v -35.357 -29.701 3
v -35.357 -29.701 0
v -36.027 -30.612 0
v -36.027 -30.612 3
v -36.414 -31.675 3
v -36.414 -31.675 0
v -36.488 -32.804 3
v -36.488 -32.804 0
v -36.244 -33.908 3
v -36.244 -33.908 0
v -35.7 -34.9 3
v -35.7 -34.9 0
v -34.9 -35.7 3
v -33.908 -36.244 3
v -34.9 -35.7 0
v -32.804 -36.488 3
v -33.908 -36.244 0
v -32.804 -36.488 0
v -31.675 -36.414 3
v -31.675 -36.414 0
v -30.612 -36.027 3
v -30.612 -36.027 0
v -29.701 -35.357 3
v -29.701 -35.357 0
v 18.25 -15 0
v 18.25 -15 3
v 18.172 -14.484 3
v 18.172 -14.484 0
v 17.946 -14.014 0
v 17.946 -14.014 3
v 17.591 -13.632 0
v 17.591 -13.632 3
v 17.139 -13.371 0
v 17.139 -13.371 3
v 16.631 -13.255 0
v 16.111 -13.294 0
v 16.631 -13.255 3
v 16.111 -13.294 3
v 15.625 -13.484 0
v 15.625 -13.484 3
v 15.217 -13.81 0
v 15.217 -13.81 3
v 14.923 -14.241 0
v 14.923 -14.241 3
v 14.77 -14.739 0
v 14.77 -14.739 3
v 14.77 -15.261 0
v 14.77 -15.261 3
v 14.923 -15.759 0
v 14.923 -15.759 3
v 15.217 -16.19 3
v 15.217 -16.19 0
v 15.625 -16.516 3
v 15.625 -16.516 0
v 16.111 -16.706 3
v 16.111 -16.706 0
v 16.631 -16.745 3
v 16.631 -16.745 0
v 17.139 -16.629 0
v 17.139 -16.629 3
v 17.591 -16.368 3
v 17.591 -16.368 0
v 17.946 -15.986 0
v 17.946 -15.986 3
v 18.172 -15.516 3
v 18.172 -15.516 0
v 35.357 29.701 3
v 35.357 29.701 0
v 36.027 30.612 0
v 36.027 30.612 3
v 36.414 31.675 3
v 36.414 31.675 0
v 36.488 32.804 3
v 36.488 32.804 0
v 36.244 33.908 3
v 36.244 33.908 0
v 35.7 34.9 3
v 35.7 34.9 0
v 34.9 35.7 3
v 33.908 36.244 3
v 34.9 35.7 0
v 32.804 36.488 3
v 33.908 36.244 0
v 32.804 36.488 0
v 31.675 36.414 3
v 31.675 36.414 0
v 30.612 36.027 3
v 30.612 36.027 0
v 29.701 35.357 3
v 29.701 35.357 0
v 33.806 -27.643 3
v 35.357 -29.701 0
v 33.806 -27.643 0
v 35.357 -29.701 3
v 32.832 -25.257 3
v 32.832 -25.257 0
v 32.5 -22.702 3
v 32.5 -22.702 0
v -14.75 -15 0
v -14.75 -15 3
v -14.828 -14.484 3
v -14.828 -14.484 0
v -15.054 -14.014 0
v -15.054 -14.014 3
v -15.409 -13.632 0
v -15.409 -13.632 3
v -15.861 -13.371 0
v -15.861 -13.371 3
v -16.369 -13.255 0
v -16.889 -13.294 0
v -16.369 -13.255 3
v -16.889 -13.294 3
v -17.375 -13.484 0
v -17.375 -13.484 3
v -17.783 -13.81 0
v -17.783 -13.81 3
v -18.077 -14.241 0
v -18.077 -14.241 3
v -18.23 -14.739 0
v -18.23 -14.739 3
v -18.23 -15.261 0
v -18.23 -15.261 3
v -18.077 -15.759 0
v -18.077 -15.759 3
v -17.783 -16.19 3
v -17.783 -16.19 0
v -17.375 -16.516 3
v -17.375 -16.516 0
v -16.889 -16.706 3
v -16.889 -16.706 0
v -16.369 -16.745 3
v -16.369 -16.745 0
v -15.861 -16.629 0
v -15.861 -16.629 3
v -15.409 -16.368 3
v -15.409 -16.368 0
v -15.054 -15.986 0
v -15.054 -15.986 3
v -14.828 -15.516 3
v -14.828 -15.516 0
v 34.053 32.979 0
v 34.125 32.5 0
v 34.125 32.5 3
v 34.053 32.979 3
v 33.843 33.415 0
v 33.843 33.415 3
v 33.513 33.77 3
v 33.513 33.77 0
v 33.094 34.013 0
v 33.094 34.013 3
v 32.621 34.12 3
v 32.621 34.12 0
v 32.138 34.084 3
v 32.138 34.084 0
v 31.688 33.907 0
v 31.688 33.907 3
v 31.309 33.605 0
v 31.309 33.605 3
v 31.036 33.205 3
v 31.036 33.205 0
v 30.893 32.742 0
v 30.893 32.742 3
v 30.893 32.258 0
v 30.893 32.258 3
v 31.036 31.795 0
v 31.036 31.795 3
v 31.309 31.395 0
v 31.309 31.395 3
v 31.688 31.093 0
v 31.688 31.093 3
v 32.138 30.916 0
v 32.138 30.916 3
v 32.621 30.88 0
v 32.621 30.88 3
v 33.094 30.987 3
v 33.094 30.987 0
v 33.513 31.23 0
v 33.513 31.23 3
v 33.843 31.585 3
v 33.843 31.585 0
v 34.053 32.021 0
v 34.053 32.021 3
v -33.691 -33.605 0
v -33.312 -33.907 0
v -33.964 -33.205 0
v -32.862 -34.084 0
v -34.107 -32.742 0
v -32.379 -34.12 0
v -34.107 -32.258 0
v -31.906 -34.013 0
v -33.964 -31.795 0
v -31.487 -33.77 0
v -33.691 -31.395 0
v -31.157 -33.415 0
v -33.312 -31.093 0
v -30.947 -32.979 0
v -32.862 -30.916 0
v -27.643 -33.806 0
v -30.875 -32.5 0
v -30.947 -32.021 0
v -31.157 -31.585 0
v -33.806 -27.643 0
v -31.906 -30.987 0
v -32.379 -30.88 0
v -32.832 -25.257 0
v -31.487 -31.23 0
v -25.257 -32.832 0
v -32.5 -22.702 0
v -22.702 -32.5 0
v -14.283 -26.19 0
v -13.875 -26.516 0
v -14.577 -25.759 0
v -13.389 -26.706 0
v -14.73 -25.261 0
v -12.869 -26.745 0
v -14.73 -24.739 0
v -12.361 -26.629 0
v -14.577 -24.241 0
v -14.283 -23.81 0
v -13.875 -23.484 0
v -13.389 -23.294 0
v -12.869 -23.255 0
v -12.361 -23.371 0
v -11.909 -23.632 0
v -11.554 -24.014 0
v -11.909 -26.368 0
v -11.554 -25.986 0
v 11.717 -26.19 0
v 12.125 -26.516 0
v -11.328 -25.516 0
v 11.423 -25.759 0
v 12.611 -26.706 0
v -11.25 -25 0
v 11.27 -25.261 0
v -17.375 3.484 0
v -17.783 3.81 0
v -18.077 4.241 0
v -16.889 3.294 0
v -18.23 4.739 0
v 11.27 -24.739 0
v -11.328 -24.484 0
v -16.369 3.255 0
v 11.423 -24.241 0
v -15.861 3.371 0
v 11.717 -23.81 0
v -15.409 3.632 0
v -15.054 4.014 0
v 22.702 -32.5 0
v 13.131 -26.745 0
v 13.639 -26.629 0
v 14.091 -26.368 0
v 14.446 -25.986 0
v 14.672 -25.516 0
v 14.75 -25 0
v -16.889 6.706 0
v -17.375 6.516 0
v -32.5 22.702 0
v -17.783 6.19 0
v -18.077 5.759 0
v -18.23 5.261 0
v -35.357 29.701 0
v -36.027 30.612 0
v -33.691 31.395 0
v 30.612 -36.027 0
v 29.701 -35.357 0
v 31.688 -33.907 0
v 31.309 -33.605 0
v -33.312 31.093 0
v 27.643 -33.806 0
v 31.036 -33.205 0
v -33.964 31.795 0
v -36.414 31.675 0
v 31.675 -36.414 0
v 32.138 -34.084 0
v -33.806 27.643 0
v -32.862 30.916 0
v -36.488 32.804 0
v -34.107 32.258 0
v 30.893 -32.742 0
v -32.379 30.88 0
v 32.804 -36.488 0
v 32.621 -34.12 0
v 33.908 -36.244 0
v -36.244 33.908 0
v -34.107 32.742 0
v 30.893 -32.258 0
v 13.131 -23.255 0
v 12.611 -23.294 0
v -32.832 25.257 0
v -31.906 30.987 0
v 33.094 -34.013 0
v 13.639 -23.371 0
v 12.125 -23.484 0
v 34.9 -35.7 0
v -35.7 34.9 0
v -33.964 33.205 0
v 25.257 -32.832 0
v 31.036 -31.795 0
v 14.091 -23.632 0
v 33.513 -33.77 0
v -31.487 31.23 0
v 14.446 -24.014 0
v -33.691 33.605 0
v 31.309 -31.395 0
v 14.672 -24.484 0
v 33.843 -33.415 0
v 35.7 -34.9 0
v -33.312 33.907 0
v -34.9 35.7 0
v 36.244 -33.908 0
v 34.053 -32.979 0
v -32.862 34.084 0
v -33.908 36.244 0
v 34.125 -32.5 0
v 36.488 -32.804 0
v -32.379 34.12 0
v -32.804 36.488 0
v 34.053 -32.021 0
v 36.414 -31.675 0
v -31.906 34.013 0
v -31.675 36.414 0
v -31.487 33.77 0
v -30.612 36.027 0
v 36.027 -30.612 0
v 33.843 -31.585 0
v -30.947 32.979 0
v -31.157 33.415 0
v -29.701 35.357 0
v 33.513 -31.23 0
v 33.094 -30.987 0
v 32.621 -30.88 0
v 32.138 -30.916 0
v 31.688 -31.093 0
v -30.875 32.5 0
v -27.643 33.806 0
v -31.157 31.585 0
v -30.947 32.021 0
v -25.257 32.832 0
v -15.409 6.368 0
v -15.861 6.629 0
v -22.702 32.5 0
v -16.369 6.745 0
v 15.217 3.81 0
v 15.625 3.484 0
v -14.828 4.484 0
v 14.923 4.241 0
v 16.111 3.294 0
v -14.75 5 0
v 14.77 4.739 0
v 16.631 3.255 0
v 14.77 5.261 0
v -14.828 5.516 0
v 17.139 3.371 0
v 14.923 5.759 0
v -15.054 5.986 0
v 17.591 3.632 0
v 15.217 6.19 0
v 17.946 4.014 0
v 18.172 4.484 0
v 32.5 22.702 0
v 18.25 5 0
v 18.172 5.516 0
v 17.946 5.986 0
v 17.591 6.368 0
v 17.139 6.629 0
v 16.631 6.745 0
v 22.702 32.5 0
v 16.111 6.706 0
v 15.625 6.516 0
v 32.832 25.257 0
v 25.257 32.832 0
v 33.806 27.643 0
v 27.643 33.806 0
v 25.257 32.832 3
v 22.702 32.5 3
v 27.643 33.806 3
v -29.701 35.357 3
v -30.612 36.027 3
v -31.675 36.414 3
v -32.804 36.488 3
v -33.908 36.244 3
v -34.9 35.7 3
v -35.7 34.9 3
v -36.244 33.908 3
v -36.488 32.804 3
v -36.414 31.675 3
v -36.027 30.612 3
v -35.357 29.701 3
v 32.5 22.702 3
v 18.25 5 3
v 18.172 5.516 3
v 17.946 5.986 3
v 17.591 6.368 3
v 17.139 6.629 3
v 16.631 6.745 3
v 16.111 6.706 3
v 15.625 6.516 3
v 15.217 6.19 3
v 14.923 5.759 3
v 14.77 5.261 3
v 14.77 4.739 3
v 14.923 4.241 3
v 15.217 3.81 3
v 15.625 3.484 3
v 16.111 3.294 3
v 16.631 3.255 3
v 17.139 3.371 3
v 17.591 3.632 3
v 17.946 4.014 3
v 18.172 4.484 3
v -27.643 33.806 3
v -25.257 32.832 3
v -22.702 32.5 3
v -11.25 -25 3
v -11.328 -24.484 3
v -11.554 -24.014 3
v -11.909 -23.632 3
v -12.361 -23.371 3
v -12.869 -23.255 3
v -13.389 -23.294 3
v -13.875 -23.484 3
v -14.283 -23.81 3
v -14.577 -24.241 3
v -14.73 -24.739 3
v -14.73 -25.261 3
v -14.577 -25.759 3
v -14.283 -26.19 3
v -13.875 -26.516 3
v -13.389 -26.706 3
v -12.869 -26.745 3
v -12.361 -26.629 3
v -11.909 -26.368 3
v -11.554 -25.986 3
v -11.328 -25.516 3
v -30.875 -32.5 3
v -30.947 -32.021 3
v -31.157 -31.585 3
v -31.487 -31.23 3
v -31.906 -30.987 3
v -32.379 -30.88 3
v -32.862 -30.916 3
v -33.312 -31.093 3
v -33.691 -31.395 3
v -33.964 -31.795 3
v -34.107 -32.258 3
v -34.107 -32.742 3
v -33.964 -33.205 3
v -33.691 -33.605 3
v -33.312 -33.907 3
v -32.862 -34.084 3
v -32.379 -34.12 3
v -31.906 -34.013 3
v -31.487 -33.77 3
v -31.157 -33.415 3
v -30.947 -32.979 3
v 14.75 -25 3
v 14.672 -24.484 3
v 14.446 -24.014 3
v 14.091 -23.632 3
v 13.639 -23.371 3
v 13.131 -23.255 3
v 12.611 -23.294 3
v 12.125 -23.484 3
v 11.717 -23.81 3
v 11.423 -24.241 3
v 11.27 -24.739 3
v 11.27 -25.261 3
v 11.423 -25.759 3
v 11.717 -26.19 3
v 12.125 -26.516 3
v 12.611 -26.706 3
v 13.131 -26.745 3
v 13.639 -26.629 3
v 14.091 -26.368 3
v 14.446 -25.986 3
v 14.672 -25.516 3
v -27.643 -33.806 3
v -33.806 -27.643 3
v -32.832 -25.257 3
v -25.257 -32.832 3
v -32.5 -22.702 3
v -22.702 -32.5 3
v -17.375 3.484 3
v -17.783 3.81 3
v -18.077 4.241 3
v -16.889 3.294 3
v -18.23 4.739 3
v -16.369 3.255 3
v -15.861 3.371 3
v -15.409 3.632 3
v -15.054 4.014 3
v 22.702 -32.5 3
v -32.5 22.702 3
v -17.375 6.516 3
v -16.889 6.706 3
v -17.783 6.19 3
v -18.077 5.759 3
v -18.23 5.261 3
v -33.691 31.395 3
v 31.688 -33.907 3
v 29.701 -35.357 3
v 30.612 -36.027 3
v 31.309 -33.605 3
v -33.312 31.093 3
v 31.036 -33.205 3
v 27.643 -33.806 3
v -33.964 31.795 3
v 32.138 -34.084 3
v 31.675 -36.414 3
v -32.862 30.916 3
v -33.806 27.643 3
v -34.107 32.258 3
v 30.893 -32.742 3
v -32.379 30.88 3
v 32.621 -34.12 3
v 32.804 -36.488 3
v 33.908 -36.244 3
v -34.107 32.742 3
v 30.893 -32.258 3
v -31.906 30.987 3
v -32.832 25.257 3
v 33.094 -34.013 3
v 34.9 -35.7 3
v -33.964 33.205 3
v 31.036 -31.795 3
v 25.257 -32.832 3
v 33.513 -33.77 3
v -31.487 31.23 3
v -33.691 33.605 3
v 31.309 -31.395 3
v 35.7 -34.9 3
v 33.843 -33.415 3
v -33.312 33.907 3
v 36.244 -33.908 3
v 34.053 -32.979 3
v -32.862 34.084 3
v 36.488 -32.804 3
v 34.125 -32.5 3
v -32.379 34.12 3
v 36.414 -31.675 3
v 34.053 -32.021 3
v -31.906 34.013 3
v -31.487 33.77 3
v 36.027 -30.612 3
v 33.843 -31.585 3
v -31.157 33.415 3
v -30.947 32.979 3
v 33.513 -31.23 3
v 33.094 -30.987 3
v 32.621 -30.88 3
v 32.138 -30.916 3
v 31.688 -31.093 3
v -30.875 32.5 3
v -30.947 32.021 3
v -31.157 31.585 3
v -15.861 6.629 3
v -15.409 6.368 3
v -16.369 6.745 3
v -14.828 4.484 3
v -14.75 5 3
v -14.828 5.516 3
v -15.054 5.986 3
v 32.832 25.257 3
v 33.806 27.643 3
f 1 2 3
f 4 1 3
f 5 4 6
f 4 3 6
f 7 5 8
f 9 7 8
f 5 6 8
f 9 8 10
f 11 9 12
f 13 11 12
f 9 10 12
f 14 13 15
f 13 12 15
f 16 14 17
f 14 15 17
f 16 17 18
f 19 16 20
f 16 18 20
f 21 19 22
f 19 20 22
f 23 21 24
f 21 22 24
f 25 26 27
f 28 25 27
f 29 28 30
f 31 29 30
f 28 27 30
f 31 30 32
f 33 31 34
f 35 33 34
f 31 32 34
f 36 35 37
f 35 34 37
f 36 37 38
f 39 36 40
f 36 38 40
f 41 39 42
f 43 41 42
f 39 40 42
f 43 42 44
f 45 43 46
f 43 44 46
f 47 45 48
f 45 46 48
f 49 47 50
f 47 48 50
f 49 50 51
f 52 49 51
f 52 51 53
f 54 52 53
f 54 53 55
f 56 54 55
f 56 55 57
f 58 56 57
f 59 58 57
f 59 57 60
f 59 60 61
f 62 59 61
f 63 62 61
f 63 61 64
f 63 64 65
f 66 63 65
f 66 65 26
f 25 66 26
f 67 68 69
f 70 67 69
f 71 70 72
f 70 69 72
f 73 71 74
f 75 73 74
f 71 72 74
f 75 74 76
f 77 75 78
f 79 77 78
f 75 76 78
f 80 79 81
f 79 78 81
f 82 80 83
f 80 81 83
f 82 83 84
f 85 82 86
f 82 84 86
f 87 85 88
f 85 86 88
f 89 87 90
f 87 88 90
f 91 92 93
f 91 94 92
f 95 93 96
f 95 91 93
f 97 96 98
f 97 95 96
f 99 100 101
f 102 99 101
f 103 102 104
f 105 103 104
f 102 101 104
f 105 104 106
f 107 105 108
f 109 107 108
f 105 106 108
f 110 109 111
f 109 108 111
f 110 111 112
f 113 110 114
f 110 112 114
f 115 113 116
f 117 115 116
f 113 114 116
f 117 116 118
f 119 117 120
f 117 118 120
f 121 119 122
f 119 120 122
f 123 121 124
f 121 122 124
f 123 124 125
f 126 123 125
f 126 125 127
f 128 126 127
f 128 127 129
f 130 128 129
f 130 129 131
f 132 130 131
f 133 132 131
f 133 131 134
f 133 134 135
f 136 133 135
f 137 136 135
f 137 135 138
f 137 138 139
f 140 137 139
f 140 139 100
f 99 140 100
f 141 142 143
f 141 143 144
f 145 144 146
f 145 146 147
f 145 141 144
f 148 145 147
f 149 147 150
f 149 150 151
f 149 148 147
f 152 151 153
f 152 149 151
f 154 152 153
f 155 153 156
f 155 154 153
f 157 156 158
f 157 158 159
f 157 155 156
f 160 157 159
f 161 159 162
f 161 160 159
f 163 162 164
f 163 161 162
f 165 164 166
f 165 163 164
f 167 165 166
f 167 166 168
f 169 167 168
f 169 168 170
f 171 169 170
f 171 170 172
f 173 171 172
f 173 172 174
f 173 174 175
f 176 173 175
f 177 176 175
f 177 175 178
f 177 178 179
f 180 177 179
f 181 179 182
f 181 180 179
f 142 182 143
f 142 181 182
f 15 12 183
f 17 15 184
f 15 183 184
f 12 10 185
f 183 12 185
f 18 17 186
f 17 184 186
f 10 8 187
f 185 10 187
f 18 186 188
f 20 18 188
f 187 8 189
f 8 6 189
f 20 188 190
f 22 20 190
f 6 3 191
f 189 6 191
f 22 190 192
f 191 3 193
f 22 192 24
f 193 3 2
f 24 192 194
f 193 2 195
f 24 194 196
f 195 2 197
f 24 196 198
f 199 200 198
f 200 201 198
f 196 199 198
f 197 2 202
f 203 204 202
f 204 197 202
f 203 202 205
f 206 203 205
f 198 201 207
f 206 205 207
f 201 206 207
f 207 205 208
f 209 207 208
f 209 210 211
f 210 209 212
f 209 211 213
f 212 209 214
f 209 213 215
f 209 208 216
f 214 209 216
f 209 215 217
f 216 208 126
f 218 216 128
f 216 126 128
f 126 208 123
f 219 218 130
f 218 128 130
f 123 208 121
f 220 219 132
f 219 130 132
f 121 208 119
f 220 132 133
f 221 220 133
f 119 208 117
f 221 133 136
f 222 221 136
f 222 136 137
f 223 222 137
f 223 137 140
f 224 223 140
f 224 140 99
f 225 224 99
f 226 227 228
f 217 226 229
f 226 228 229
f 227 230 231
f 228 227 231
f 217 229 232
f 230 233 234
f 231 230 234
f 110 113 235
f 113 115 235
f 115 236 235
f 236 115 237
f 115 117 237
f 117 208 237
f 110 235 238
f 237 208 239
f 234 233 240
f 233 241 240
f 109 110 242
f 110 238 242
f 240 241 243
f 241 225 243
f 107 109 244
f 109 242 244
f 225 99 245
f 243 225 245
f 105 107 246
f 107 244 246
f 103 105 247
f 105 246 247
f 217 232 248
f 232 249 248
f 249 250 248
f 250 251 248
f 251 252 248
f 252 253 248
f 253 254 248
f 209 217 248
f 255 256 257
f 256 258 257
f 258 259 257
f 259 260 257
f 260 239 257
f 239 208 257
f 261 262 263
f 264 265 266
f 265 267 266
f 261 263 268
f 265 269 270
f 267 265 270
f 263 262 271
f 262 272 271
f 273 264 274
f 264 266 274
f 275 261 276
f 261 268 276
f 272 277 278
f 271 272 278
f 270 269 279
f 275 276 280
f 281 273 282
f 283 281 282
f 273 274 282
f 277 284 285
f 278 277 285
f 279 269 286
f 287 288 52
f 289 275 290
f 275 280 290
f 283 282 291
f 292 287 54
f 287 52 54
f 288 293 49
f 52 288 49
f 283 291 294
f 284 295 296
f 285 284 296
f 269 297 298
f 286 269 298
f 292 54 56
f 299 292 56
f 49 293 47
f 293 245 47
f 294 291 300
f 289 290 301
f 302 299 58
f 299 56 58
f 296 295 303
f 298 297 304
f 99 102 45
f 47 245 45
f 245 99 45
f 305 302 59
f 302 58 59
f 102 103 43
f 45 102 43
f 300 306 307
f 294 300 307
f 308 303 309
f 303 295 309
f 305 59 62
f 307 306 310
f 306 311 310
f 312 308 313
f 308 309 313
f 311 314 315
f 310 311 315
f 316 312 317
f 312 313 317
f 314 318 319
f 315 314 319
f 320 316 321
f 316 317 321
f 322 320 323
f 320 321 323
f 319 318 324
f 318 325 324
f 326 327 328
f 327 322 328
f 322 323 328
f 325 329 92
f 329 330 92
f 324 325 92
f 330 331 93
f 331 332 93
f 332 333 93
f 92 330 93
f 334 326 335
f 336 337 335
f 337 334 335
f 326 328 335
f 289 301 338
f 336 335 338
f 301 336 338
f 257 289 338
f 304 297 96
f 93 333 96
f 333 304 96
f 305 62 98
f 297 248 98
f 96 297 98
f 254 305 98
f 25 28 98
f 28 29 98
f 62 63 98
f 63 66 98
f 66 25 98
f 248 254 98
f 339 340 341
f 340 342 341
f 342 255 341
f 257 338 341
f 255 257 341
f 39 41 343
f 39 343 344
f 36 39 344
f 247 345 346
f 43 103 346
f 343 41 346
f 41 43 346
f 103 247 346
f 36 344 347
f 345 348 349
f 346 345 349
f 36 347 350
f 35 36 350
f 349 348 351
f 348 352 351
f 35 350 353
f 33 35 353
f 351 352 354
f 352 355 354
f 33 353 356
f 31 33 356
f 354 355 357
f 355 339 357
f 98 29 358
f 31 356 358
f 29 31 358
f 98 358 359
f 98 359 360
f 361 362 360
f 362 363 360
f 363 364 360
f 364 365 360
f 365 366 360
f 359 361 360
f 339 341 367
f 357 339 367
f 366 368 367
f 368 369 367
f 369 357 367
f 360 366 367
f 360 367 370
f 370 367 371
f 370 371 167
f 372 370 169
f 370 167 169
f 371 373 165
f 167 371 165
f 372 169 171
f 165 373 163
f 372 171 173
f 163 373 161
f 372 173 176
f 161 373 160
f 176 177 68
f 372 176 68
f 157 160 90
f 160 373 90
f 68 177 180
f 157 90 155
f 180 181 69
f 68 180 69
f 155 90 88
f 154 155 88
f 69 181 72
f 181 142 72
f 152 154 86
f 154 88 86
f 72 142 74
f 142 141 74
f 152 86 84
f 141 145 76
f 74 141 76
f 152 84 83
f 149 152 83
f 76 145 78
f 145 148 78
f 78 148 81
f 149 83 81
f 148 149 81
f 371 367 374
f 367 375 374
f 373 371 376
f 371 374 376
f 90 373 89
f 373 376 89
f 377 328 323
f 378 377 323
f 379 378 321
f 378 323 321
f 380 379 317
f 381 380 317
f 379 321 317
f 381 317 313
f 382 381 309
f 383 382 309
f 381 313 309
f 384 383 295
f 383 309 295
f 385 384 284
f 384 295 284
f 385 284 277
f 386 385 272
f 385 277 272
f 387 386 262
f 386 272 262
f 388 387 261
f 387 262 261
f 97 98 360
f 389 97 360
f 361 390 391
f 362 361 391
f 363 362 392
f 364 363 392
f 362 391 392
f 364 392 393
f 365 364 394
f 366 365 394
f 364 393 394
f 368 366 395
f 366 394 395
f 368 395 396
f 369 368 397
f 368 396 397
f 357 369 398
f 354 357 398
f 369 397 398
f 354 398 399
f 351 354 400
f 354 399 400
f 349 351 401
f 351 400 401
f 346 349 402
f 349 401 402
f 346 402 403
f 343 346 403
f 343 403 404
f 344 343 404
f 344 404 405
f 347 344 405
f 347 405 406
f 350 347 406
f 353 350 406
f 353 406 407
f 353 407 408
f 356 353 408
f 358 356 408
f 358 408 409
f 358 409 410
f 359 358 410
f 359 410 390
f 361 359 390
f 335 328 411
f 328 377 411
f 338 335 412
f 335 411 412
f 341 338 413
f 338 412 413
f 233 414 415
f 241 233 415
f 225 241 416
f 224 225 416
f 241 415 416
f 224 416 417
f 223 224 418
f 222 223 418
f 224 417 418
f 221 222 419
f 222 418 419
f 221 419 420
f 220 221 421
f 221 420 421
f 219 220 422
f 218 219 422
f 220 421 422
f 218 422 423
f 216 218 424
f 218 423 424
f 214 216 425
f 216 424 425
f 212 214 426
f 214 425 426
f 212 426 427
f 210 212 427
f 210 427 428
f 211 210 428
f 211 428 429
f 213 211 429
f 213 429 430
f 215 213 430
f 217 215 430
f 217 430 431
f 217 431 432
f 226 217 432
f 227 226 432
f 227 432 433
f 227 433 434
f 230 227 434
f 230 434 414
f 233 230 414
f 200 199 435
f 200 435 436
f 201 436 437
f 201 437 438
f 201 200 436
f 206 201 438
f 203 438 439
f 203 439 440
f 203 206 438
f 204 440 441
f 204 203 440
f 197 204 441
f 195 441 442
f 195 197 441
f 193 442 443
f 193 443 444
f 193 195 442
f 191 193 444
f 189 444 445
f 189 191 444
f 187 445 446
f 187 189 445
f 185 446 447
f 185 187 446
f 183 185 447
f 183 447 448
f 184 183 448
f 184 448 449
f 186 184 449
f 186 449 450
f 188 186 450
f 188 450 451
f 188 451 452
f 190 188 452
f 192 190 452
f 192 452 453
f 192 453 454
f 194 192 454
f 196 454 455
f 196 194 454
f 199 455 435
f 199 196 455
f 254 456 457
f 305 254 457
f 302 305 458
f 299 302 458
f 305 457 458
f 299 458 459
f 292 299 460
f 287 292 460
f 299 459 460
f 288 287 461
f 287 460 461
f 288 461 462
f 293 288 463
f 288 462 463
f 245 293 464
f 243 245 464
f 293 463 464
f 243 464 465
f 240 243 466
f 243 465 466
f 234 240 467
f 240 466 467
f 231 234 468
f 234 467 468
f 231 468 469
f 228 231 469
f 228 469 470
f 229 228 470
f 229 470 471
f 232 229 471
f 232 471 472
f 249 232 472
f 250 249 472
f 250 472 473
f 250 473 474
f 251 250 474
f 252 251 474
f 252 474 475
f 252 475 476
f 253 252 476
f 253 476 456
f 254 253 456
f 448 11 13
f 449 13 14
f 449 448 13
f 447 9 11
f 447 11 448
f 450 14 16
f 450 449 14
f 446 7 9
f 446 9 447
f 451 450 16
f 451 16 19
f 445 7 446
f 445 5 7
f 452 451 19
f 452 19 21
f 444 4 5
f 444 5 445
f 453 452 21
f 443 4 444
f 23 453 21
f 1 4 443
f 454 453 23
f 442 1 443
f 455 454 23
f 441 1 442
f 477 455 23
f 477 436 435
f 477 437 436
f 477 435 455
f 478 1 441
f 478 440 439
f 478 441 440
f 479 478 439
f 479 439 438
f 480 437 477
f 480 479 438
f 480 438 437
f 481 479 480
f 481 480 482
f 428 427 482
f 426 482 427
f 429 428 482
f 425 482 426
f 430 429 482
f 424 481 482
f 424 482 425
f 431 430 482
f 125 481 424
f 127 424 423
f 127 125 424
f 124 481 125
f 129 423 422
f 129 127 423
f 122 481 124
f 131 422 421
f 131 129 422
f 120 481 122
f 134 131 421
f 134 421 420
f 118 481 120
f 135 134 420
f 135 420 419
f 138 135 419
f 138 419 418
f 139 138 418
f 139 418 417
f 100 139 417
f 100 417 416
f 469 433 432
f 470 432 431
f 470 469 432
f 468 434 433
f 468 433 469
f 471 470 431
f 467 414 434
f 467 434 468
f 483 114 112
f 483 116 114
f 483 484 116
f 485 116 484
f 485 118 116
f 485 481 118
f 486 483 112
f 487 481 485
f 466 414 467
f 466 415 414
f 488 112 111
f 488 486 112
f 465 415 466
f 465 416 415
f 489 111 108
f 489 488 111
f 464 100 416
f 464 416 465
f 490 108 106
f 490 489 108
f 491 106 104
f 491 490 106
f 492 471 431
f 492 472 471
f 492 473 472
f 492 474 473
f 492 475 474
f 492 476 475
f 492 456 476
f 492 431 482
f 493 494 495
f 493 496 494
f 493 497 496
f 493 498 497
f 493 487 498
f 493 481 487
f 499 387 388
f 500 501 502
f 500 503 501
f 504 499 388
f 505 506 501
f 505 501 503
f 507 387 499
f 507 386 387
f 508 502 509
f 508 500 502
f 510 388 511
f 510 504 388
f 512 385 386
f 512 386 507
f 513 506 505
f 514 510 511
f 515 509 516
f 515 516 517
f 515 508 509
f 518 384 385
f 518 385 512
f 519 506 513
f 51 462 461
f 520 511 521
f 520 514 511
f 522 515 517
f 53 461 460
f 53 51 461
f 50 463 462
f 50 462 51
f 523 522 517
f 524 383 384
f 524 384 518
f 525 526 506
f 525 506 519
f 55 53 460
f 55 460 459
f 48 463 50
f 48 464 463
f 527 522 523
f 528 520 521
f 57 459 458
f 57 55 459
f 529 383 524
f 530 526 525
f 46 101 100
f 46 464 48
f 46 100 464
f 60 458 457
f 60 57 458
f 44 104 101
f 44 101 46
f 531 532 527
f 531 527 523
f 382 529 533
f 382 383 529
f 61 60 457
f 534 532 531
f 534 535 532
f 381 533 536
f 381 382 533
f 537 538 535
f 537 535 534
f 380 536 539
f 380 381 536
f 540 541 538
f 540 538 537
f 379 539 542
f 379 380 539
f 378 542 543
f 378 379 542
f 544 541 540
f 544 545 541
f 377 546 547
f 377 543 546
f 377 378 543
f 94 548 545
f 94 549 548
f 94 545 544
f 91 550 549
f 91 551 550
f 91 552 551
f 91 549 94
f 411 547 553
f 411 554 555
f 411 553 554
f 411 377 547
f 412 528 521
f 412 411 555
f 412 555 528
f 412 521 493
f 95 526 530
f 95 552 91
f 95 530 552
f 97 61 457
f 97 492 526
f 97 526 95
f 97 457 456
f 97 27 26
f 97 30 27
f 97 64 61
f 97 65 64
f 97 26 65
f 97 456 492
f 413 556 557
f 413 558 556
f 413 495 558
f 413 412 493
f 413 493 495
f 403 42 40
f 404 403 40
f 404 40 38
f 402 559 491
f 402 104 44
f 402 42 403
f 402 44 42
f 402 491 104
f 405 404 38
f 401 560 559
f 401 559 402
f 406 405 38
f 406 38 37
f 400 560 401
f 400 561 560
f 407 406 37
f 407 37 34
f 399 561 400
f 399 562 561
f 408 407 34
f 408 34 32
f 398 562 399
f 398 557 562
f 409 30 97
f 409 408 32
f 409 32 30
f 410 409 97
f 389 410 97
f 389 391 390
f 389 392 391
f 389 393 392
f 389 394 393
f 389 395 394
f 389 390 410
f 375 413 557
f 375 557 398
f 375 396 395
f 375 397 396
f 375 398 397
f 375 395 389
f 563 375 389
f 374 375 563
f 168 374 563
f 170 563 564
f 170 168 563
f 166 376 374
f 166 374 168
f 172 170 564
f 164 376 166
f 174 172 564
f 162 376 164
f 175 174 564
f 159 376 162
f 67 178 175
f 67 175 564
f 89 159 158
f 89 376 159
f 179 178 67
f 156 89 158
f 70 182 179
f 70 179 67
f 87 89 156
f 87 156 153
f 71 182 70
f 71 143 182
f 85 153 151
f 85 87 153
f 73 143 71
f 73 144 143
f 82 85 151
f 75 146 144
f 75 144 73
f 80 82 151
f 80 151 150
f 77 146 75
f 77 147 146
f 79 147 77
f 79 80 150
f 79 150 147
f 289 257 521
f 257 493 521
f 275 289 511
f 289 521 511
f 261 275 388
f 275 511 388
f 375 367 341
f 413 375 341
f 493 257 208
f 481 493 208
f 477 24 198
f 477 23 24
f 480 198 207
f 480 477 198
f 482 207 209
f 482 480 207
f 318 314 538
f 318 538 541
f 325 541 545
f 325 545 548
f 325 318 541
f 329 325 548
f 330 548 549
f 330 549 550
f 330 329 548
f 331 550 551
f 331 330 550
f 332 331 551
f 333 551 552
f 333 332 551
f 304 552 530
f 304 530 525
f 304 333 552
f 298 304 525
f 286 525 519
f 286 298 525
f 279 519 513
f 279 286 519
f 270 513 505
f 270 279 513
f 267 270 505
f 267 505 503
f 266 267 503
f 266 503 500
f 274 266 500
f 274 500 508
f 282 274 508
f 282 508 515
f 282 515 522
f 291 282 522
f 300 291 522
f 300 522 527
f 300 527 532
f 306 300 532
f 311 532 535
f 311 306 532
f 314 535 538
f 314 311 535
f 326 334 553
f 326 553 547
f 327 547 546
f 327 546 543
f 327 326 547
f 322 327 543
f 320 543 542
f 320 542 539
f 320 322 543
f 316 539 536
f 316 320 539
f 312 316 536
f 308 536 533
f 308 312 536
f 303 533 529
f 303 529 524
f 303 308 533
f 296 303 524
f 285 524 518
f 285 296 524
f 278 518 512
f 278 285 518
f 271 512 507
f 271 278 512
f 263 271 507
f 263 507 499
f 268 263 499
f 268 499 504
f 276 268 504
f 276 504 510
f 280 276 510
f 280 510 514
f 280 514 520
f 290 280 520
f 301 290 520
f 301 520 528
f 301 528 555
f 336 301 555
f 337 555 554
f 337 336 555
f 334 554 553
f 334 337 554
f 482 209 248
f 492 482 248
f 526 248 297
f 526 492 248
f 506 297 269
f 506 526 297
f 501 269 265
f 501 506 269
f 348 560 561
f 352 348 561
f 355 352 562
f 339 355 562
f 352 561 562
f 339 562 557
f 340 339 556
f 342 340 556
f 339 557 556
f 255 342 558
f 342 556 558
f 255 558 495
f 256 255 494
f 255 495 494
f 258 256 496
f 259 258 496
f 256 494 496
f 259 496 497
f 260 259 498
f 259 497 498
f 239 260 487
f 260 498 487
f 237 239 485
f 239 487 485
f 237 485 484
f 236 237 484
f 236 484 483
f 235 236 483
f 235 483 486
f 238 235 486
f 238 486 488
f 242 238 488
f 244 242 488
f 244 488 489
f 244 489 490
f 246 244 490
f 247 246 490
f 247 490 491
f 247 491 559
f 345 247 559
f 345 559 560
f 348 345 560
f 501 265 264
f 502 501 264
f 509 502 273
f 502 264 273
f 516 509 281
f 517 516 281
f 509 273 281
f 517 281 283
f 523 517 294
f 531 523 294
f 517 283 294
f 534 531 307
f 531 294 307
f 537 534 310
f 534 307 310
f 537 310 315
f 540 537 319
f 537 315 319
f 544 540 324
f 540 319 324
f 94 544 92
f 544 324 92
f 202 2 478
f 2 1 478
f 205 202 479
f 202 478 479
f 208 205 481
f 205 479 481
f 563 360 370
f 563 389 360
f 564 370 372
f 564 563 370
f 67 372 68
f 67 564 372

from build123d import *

# Parameters (mm, degrees)
SKETCH_1_R          = 1.625
EXTRUDE_1_DEPTH     = 3
FILLET_1_R          = 10
SKETCH_2_R          = 1.75
CUT_EXTRUDE_1_DEPTH = 10
SKETCH_4_R          = 1.75
CUT_EXTRUDE_2_DEPTH = 10
SKETCH_5_R          = 1.75
CUT_EXTRUDE_3_DEPTH = 10


with BuildPart() as part:
    # Эскиз1 → Бобышка-Вытянуть1 (new body)
    with BuildSketch(Plane.XY):
        with BuildLine():
            ThreePointArc((-32.5, -28.5), (-35.328427125, -35.328427125), (-28.5, -32.5))
            Line((-28.5, -32.5), (28.5, -32.5))
            ThreePointArc((28.5, -32.5), (35.328427125, -35.328427125), (32.5, -28.5))
            Line((32.5, -28.5), (32.5, 28.5))
            ThreePointArc((32.5, 28.5), (35.328427125, 35.328427125), (28.5, 32.5))
            Line((28.5, 32.5), (-28.5, 32.5))
            ThreePointArc((-28.5, 32.5), (-35.328427125, 35.328427125), (-32.5, 28.5))
            Line((-32.5, 28.5), (-32.5, -28.5))
        make_face()
        with Locations((-32.5, -32.5)):
            Circle(SKETCH_1_R, mode=Mode.SUBTRACT)
        with Locations((32.5, 32.5)):
            Circle(SKETCH_1_R, mode=Mode.SUBTRACT)
        with Locations((-32.5, 32.5)):
            Circle(SKETCH_1_R, mode=Mode.SUBTRACT)
        with Locations((32.5, -32.5)):
            Circle(SKETCH_1_R, mode=Mode.SUBTRACT)
    extrude(amount=EXTRUDE_1_DEPTH)

    # Скругление1
    fillet_1_edges = [part.edges().sort_by_distance(p)[0] for p in [
        (-32.5, -28.5, 1.5),
        (-32.5, 28.5, 1.5),
        (-28.5, 32.5, 1.5),
        (28.5, 32.5, 1.5),
        (32.5, 28.5, 1.5),
        (32.5, -28.5, 1.5),
        (28.5, -32.5, 1.5),
        (-28.5, -32.5, 1.5),
    ]]
    fillet(fillet_1_edges, radius=FILLET_1_R)

    # Эскиз2 → Вырез-Вытянуть1 (cut)
    with BuildSketch(Plane.XY.offset(3)):
        with Locations((-13, -25)):
            Circle(SKETCH_2_R)
        with Locations((13, -25)):
            Circle(SKETCH_2_R)
    extrude(amount=-CUT_EXTRUDE_1_DEPTH, mode=Mode.SUBTRACT)

    # Эскиз4 → Вырез-Вытянуть2 (cut)
    with BuildSketch(Plane.XY.offset(3)):
        with Locations((-16.5, -15)):
            Circle(SKETCH_4_R)
        with Locations((16.5, -15)):
            Circle(SKETCH_4_R)
    extrude(amount=-CUT_EXTRUDE_2_DEPTH, mode=Mode.SUBTRACT)

    # Эскиз5 → Вырез-Вытянуть3 (cut)
    with BuildSketch(Plane.XY.offset(3)):
        with Locations((-16.5, 5)):
            Circle(SKETCH_5_R)
        with Locations((16.5, 5)):
            Circle(SKETCH_5_R)
    extrude(amount=-CUT_EXTRUDE_3_DEPTH, mode=Mode.SUBTRACT)


solid = part.part
